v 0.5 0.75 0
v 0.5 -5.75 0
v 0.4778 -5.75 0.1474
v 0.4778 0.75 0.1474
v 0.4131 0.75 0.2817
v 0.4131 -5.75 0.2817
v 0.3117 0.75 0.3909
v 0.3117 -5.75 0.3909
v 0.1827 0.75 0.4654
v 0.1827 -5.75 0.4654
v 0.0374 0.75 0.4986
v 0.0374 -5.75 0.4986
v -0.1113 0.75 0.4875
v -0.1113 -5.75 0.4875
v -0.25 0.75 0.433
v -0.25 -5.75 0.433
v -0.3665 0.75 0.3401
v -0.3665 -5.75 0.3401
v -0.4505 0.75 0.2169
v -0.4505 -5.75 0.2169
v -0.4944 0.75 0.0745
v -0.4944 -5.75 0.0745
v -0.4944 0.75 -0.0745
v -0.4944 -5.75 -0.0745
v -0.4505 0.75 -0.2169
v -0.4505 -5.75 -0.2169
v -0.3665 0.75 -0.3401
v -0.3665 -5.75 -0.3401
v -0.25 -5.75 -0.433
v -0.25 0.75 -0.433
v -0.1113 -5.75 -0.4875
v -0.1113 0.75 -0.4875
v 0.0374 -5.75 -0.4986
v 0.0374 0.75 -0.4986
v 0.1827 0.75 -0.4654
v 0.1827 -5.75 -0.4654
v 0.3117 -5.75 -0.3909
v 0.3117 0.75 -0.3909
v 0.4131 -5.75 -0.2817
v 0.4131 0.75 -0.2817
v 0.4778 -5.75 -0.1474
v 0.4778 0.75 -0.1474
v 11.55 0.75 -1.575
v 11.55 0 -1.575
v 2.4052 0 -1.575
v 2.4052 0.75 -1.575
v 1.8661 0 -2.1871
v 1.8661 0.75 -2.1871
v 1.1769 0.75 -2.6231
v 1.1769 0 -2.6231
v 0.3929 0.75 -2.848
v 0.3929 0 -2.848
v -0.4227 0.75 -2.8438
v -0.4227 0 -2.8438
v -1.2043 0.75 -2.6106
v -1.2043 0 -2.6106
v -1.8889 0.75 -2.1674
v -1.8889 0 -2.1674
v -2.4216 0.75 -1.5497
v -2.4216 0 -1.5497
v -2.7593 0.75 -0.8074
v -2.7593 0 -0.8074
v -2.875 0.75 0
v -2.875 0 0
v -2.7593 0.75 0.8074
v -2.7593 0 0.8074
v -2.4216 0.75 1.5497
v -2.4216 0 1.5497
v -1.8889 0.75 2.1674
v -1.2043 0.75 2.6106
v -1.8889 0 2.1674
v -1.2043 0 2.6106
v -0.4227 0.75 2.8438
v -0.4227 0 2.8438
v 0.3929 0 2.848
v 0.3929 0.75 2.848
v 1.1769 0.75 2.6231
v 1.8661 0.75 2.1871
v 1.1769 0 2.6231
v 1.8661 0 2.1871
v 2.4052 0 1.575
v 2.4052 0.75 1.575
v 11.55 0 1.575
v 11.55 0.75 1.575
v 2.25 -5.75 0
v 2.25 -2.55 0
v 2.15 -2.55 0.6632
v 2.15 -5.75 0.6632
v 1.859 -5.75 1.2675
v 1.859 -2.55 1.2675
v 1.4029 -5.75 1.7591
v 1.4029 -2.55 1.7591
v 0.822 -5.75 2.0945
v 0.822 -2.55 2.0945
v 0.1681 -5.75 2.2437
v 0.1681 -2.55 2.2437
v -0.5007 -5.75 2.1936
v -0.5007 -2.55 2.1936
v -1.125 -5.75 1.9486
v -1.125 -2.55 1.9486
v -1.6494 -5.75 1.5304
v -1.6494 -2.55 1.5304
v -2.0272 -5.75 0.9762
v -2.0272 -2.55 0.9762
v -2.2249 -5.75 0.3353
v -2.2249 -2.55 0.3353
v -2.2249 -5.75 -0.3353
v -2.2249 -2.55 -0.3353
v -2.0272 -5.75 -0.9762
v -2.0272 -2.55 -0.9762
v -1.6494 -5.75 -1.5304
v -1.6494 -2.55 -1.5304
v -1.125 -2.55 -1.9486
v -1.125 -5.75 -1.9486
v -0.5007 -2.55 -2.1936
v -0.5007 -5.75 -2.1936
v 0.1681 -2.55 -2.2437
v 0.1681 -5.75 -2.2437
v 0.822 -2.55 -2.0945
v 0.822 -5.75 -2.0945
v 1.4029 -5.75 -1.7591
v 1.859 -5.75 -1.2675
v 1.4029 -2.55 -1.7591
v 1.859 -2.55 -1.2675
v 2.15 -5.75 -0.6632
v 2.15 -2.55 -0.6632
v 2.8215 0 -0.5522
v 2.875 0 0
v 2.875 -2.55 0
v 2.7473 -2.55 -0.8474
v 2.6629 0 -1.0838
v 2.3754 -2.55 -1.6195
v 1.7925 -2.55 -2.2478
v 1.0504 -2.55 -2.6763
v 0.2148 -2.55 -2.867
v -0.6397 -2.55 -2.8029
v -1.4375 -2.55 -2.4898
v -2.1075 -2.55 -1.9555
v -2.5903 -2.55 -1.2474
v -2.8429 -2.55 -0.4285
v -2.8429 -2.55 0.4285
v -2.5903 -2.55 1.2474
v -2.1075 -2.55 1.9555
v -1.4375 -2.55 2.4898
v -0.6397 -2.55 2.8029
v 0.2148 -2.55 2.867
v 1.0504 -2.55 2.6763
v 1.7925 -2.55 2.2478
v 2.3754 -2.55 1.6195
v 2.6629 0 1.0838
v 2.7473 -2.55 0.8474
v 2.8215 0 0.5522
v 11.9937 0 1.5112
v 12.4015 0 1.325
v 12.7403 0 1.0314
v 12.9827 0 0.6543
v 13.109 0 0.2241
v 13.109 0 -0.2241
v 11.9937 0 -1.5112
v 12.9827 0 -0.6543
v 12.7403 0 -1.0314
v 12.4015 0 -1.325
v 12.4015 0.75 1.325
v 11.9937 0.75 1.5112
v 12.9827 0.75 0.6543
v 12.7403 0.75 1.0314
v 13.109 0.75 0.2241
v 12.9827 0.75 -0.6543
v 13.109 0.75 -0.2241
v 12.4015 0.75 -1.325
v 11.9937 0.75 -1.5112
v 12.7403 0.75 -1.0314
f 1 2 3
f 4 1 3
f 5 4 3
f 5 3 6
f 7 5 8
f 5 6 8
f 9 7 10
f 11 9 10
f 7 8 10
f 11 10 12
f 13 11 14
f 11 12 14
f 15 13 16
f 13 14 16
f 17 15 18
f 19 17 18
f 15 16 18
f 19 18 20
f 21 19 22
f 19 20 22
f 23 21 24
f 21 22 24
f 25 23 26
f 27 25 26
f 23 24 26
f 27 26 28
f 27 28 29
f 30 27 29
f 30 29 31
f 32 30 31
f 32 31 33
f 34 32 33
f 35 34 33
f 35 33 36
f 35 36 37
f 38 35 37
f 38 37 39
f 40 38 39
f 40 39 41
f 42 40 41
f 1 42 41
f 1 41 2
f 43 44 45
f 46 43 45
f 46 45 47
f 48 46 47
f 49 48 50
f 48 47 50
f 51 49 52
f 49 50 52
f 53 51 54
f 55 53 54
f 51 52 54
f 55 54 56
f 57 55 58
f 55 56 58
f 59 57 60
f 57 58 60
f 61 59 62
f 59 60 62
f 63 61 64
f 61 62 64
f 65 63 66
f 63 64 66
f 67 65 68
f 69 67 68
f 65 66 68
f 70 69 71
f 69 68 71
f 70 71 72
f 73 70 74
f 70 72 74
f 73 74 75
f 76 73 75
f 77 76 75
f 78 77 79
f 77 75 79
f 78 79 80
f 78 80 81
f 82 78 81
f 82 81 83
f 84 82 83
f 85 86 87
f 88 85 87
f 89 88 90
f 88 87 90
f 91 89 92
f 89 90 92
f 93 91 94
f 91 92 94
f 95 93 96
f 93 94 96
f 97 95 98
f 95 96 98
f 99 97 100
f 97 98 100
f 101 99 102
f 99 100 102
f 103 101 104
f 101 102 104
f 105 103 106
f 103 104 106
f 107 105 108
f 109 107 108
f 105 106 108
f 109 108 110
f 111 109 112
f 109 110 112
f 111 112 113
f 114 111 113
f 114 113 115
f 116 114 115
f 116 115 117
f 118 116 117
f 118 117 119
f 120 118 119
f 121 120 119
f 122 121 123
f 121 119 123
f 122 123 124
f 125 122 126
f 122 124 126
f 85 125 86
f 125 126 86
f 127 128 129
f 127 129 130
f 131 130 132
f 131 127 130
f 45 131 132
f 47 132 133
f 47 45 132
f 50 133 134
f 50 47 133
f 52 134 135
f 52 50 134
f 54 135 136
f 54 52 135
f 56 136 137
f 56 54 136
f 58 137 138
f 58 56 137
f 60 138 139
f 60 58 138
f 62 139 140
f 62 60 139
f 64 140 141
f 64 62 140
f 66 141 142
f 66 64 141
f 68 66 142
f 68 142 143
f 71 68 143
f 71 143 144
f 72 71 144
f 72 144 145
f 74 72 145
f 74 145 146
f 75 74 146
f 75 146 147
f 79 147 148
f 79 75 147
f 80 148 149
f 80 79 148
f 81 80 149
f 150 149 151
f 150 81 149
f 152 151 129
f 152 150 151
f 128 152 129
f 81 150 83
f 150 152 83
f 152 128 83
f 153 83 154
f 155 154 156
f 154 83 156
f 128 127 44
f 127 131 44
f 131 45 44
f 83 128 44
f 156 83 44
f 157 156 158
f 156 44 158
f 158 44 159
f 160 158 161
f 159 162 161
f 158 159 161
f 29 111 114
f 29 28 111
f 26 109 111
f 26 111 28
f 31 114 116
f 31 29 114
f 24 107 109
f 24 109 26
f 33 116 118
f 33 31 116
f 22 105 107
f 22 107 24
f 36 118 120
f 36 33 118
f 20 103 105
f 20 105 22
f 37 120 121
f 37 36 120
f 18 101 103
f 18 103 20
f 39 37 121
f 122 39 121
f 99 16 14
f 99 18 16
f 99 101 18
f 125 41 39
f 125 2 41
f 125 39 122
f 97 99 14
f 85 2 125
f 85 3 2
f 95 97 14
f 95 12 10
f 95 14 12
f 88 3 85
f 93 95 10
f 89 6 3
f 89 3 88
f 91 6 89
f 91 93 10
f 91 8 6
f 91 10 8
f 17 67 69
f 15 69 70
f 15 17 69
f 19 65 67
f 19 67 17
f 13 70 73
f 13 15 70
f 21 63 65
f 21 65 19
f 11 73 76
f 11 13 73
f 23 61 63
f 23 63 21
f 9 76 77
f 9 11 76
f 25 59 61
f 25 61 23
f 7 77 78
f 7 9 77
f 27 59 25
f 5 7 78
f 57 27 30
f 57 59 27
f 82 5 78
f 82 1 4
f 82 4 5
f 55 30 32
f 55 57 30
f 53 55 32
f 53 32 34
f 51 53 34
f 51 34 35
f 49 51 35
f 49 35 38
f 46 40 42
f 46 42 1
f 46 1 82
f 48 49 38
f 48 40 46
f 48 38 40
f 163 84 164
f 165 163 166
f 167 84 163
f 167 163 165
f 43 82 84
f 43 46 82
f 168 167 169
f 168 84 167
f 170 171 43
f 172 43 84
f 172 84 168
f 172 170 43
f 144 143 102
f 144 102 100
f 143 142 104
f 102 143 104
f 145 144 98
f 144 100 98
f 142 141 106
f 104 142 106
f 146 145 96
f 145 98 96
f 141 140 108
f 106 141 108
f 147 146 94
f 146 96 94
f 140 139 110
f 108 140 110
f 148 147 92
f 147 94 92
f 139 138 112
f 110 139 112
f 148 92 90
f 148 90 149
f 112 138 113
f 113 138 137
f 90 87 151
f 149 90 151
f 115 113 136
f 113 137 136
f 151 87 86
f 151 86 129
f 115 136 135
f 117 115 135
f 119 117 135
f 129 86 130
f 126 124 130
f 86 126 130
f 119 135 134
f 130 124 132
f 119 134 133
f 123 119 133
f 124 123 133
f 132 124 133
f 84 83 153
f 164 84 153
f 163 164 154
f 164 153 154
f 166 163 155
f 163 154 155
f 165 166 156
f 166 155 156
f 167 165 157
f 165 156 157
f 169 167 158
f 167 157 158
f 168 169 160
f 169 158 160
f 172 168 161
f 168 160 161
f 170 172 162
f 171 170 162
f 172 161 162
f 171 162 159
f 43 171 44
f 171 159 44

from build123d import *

# Parameters (mm, degrees)
SKETCH1_R           = 2.875
BOSS_EXTRUDE1_DEPTH = 2.55
BOSS_EXTRUDE2_DEPTH = 0.75
SKETCH2_R           = 2.25
BOSS_EXTRUDE3_DEPTH = 3.2
SKETCH3_R           = 0.5
CUT_EXTRUDE1_DEPTH  = 7.5


with BuildPart() as part:
    # Sketch1 → Boss-Extrude1 (new body)
    with BuildSketch(Plane(origin=(0, 0, 0), x_dir=(1, 0, 0), z_dir=(0, 1, 0))):
        Circle(SKETCH1_R)
    extrude(amount=-BOSS_EXTRUDE1_DEPTH)

    # Sketch1<4> → Boss-Extrude2 (add)
    with BuildSketch(Plane(origin=(0, 0, 0), x_dir=(1, 0, 0), z_dir=(0, 1, 0))):
        with BuildLine():
            Line((2.405202694, -1.575), (11.55, -1.575))
            ThreePointArc((11.55, -1.575), (13.125, 0), (11.55, 1.575))
            Line((11.55, 1.575), (2.405202694, 1.575))
            ThreePointArc((2.405202694, 1.575), (-2.875, 0), (2.405202694, -1.575))
        make_face()
    extrude(amount=BOSS_EXTRUDE2_DEPTH)

    # Sketch2 → Boss-Extrude3 (add)
    with BuildSketch(Plane.XZ.offset(2.55)):
        Circle(SKETCH2_R)
    extrude(amount=BOSS_EXTRUDE3_DEPTH)

    # Sketch3 → Cut-Extrude1 (cut, through all)
    with BuildSketch(Plane.XZ.offset(5.75)):
        Circle(SKETCH3_R)
    extrude(amount=-CUT_EXTRUDE1_DEPTH, mode=Mode.SUBTRACT)


solid = part.part
